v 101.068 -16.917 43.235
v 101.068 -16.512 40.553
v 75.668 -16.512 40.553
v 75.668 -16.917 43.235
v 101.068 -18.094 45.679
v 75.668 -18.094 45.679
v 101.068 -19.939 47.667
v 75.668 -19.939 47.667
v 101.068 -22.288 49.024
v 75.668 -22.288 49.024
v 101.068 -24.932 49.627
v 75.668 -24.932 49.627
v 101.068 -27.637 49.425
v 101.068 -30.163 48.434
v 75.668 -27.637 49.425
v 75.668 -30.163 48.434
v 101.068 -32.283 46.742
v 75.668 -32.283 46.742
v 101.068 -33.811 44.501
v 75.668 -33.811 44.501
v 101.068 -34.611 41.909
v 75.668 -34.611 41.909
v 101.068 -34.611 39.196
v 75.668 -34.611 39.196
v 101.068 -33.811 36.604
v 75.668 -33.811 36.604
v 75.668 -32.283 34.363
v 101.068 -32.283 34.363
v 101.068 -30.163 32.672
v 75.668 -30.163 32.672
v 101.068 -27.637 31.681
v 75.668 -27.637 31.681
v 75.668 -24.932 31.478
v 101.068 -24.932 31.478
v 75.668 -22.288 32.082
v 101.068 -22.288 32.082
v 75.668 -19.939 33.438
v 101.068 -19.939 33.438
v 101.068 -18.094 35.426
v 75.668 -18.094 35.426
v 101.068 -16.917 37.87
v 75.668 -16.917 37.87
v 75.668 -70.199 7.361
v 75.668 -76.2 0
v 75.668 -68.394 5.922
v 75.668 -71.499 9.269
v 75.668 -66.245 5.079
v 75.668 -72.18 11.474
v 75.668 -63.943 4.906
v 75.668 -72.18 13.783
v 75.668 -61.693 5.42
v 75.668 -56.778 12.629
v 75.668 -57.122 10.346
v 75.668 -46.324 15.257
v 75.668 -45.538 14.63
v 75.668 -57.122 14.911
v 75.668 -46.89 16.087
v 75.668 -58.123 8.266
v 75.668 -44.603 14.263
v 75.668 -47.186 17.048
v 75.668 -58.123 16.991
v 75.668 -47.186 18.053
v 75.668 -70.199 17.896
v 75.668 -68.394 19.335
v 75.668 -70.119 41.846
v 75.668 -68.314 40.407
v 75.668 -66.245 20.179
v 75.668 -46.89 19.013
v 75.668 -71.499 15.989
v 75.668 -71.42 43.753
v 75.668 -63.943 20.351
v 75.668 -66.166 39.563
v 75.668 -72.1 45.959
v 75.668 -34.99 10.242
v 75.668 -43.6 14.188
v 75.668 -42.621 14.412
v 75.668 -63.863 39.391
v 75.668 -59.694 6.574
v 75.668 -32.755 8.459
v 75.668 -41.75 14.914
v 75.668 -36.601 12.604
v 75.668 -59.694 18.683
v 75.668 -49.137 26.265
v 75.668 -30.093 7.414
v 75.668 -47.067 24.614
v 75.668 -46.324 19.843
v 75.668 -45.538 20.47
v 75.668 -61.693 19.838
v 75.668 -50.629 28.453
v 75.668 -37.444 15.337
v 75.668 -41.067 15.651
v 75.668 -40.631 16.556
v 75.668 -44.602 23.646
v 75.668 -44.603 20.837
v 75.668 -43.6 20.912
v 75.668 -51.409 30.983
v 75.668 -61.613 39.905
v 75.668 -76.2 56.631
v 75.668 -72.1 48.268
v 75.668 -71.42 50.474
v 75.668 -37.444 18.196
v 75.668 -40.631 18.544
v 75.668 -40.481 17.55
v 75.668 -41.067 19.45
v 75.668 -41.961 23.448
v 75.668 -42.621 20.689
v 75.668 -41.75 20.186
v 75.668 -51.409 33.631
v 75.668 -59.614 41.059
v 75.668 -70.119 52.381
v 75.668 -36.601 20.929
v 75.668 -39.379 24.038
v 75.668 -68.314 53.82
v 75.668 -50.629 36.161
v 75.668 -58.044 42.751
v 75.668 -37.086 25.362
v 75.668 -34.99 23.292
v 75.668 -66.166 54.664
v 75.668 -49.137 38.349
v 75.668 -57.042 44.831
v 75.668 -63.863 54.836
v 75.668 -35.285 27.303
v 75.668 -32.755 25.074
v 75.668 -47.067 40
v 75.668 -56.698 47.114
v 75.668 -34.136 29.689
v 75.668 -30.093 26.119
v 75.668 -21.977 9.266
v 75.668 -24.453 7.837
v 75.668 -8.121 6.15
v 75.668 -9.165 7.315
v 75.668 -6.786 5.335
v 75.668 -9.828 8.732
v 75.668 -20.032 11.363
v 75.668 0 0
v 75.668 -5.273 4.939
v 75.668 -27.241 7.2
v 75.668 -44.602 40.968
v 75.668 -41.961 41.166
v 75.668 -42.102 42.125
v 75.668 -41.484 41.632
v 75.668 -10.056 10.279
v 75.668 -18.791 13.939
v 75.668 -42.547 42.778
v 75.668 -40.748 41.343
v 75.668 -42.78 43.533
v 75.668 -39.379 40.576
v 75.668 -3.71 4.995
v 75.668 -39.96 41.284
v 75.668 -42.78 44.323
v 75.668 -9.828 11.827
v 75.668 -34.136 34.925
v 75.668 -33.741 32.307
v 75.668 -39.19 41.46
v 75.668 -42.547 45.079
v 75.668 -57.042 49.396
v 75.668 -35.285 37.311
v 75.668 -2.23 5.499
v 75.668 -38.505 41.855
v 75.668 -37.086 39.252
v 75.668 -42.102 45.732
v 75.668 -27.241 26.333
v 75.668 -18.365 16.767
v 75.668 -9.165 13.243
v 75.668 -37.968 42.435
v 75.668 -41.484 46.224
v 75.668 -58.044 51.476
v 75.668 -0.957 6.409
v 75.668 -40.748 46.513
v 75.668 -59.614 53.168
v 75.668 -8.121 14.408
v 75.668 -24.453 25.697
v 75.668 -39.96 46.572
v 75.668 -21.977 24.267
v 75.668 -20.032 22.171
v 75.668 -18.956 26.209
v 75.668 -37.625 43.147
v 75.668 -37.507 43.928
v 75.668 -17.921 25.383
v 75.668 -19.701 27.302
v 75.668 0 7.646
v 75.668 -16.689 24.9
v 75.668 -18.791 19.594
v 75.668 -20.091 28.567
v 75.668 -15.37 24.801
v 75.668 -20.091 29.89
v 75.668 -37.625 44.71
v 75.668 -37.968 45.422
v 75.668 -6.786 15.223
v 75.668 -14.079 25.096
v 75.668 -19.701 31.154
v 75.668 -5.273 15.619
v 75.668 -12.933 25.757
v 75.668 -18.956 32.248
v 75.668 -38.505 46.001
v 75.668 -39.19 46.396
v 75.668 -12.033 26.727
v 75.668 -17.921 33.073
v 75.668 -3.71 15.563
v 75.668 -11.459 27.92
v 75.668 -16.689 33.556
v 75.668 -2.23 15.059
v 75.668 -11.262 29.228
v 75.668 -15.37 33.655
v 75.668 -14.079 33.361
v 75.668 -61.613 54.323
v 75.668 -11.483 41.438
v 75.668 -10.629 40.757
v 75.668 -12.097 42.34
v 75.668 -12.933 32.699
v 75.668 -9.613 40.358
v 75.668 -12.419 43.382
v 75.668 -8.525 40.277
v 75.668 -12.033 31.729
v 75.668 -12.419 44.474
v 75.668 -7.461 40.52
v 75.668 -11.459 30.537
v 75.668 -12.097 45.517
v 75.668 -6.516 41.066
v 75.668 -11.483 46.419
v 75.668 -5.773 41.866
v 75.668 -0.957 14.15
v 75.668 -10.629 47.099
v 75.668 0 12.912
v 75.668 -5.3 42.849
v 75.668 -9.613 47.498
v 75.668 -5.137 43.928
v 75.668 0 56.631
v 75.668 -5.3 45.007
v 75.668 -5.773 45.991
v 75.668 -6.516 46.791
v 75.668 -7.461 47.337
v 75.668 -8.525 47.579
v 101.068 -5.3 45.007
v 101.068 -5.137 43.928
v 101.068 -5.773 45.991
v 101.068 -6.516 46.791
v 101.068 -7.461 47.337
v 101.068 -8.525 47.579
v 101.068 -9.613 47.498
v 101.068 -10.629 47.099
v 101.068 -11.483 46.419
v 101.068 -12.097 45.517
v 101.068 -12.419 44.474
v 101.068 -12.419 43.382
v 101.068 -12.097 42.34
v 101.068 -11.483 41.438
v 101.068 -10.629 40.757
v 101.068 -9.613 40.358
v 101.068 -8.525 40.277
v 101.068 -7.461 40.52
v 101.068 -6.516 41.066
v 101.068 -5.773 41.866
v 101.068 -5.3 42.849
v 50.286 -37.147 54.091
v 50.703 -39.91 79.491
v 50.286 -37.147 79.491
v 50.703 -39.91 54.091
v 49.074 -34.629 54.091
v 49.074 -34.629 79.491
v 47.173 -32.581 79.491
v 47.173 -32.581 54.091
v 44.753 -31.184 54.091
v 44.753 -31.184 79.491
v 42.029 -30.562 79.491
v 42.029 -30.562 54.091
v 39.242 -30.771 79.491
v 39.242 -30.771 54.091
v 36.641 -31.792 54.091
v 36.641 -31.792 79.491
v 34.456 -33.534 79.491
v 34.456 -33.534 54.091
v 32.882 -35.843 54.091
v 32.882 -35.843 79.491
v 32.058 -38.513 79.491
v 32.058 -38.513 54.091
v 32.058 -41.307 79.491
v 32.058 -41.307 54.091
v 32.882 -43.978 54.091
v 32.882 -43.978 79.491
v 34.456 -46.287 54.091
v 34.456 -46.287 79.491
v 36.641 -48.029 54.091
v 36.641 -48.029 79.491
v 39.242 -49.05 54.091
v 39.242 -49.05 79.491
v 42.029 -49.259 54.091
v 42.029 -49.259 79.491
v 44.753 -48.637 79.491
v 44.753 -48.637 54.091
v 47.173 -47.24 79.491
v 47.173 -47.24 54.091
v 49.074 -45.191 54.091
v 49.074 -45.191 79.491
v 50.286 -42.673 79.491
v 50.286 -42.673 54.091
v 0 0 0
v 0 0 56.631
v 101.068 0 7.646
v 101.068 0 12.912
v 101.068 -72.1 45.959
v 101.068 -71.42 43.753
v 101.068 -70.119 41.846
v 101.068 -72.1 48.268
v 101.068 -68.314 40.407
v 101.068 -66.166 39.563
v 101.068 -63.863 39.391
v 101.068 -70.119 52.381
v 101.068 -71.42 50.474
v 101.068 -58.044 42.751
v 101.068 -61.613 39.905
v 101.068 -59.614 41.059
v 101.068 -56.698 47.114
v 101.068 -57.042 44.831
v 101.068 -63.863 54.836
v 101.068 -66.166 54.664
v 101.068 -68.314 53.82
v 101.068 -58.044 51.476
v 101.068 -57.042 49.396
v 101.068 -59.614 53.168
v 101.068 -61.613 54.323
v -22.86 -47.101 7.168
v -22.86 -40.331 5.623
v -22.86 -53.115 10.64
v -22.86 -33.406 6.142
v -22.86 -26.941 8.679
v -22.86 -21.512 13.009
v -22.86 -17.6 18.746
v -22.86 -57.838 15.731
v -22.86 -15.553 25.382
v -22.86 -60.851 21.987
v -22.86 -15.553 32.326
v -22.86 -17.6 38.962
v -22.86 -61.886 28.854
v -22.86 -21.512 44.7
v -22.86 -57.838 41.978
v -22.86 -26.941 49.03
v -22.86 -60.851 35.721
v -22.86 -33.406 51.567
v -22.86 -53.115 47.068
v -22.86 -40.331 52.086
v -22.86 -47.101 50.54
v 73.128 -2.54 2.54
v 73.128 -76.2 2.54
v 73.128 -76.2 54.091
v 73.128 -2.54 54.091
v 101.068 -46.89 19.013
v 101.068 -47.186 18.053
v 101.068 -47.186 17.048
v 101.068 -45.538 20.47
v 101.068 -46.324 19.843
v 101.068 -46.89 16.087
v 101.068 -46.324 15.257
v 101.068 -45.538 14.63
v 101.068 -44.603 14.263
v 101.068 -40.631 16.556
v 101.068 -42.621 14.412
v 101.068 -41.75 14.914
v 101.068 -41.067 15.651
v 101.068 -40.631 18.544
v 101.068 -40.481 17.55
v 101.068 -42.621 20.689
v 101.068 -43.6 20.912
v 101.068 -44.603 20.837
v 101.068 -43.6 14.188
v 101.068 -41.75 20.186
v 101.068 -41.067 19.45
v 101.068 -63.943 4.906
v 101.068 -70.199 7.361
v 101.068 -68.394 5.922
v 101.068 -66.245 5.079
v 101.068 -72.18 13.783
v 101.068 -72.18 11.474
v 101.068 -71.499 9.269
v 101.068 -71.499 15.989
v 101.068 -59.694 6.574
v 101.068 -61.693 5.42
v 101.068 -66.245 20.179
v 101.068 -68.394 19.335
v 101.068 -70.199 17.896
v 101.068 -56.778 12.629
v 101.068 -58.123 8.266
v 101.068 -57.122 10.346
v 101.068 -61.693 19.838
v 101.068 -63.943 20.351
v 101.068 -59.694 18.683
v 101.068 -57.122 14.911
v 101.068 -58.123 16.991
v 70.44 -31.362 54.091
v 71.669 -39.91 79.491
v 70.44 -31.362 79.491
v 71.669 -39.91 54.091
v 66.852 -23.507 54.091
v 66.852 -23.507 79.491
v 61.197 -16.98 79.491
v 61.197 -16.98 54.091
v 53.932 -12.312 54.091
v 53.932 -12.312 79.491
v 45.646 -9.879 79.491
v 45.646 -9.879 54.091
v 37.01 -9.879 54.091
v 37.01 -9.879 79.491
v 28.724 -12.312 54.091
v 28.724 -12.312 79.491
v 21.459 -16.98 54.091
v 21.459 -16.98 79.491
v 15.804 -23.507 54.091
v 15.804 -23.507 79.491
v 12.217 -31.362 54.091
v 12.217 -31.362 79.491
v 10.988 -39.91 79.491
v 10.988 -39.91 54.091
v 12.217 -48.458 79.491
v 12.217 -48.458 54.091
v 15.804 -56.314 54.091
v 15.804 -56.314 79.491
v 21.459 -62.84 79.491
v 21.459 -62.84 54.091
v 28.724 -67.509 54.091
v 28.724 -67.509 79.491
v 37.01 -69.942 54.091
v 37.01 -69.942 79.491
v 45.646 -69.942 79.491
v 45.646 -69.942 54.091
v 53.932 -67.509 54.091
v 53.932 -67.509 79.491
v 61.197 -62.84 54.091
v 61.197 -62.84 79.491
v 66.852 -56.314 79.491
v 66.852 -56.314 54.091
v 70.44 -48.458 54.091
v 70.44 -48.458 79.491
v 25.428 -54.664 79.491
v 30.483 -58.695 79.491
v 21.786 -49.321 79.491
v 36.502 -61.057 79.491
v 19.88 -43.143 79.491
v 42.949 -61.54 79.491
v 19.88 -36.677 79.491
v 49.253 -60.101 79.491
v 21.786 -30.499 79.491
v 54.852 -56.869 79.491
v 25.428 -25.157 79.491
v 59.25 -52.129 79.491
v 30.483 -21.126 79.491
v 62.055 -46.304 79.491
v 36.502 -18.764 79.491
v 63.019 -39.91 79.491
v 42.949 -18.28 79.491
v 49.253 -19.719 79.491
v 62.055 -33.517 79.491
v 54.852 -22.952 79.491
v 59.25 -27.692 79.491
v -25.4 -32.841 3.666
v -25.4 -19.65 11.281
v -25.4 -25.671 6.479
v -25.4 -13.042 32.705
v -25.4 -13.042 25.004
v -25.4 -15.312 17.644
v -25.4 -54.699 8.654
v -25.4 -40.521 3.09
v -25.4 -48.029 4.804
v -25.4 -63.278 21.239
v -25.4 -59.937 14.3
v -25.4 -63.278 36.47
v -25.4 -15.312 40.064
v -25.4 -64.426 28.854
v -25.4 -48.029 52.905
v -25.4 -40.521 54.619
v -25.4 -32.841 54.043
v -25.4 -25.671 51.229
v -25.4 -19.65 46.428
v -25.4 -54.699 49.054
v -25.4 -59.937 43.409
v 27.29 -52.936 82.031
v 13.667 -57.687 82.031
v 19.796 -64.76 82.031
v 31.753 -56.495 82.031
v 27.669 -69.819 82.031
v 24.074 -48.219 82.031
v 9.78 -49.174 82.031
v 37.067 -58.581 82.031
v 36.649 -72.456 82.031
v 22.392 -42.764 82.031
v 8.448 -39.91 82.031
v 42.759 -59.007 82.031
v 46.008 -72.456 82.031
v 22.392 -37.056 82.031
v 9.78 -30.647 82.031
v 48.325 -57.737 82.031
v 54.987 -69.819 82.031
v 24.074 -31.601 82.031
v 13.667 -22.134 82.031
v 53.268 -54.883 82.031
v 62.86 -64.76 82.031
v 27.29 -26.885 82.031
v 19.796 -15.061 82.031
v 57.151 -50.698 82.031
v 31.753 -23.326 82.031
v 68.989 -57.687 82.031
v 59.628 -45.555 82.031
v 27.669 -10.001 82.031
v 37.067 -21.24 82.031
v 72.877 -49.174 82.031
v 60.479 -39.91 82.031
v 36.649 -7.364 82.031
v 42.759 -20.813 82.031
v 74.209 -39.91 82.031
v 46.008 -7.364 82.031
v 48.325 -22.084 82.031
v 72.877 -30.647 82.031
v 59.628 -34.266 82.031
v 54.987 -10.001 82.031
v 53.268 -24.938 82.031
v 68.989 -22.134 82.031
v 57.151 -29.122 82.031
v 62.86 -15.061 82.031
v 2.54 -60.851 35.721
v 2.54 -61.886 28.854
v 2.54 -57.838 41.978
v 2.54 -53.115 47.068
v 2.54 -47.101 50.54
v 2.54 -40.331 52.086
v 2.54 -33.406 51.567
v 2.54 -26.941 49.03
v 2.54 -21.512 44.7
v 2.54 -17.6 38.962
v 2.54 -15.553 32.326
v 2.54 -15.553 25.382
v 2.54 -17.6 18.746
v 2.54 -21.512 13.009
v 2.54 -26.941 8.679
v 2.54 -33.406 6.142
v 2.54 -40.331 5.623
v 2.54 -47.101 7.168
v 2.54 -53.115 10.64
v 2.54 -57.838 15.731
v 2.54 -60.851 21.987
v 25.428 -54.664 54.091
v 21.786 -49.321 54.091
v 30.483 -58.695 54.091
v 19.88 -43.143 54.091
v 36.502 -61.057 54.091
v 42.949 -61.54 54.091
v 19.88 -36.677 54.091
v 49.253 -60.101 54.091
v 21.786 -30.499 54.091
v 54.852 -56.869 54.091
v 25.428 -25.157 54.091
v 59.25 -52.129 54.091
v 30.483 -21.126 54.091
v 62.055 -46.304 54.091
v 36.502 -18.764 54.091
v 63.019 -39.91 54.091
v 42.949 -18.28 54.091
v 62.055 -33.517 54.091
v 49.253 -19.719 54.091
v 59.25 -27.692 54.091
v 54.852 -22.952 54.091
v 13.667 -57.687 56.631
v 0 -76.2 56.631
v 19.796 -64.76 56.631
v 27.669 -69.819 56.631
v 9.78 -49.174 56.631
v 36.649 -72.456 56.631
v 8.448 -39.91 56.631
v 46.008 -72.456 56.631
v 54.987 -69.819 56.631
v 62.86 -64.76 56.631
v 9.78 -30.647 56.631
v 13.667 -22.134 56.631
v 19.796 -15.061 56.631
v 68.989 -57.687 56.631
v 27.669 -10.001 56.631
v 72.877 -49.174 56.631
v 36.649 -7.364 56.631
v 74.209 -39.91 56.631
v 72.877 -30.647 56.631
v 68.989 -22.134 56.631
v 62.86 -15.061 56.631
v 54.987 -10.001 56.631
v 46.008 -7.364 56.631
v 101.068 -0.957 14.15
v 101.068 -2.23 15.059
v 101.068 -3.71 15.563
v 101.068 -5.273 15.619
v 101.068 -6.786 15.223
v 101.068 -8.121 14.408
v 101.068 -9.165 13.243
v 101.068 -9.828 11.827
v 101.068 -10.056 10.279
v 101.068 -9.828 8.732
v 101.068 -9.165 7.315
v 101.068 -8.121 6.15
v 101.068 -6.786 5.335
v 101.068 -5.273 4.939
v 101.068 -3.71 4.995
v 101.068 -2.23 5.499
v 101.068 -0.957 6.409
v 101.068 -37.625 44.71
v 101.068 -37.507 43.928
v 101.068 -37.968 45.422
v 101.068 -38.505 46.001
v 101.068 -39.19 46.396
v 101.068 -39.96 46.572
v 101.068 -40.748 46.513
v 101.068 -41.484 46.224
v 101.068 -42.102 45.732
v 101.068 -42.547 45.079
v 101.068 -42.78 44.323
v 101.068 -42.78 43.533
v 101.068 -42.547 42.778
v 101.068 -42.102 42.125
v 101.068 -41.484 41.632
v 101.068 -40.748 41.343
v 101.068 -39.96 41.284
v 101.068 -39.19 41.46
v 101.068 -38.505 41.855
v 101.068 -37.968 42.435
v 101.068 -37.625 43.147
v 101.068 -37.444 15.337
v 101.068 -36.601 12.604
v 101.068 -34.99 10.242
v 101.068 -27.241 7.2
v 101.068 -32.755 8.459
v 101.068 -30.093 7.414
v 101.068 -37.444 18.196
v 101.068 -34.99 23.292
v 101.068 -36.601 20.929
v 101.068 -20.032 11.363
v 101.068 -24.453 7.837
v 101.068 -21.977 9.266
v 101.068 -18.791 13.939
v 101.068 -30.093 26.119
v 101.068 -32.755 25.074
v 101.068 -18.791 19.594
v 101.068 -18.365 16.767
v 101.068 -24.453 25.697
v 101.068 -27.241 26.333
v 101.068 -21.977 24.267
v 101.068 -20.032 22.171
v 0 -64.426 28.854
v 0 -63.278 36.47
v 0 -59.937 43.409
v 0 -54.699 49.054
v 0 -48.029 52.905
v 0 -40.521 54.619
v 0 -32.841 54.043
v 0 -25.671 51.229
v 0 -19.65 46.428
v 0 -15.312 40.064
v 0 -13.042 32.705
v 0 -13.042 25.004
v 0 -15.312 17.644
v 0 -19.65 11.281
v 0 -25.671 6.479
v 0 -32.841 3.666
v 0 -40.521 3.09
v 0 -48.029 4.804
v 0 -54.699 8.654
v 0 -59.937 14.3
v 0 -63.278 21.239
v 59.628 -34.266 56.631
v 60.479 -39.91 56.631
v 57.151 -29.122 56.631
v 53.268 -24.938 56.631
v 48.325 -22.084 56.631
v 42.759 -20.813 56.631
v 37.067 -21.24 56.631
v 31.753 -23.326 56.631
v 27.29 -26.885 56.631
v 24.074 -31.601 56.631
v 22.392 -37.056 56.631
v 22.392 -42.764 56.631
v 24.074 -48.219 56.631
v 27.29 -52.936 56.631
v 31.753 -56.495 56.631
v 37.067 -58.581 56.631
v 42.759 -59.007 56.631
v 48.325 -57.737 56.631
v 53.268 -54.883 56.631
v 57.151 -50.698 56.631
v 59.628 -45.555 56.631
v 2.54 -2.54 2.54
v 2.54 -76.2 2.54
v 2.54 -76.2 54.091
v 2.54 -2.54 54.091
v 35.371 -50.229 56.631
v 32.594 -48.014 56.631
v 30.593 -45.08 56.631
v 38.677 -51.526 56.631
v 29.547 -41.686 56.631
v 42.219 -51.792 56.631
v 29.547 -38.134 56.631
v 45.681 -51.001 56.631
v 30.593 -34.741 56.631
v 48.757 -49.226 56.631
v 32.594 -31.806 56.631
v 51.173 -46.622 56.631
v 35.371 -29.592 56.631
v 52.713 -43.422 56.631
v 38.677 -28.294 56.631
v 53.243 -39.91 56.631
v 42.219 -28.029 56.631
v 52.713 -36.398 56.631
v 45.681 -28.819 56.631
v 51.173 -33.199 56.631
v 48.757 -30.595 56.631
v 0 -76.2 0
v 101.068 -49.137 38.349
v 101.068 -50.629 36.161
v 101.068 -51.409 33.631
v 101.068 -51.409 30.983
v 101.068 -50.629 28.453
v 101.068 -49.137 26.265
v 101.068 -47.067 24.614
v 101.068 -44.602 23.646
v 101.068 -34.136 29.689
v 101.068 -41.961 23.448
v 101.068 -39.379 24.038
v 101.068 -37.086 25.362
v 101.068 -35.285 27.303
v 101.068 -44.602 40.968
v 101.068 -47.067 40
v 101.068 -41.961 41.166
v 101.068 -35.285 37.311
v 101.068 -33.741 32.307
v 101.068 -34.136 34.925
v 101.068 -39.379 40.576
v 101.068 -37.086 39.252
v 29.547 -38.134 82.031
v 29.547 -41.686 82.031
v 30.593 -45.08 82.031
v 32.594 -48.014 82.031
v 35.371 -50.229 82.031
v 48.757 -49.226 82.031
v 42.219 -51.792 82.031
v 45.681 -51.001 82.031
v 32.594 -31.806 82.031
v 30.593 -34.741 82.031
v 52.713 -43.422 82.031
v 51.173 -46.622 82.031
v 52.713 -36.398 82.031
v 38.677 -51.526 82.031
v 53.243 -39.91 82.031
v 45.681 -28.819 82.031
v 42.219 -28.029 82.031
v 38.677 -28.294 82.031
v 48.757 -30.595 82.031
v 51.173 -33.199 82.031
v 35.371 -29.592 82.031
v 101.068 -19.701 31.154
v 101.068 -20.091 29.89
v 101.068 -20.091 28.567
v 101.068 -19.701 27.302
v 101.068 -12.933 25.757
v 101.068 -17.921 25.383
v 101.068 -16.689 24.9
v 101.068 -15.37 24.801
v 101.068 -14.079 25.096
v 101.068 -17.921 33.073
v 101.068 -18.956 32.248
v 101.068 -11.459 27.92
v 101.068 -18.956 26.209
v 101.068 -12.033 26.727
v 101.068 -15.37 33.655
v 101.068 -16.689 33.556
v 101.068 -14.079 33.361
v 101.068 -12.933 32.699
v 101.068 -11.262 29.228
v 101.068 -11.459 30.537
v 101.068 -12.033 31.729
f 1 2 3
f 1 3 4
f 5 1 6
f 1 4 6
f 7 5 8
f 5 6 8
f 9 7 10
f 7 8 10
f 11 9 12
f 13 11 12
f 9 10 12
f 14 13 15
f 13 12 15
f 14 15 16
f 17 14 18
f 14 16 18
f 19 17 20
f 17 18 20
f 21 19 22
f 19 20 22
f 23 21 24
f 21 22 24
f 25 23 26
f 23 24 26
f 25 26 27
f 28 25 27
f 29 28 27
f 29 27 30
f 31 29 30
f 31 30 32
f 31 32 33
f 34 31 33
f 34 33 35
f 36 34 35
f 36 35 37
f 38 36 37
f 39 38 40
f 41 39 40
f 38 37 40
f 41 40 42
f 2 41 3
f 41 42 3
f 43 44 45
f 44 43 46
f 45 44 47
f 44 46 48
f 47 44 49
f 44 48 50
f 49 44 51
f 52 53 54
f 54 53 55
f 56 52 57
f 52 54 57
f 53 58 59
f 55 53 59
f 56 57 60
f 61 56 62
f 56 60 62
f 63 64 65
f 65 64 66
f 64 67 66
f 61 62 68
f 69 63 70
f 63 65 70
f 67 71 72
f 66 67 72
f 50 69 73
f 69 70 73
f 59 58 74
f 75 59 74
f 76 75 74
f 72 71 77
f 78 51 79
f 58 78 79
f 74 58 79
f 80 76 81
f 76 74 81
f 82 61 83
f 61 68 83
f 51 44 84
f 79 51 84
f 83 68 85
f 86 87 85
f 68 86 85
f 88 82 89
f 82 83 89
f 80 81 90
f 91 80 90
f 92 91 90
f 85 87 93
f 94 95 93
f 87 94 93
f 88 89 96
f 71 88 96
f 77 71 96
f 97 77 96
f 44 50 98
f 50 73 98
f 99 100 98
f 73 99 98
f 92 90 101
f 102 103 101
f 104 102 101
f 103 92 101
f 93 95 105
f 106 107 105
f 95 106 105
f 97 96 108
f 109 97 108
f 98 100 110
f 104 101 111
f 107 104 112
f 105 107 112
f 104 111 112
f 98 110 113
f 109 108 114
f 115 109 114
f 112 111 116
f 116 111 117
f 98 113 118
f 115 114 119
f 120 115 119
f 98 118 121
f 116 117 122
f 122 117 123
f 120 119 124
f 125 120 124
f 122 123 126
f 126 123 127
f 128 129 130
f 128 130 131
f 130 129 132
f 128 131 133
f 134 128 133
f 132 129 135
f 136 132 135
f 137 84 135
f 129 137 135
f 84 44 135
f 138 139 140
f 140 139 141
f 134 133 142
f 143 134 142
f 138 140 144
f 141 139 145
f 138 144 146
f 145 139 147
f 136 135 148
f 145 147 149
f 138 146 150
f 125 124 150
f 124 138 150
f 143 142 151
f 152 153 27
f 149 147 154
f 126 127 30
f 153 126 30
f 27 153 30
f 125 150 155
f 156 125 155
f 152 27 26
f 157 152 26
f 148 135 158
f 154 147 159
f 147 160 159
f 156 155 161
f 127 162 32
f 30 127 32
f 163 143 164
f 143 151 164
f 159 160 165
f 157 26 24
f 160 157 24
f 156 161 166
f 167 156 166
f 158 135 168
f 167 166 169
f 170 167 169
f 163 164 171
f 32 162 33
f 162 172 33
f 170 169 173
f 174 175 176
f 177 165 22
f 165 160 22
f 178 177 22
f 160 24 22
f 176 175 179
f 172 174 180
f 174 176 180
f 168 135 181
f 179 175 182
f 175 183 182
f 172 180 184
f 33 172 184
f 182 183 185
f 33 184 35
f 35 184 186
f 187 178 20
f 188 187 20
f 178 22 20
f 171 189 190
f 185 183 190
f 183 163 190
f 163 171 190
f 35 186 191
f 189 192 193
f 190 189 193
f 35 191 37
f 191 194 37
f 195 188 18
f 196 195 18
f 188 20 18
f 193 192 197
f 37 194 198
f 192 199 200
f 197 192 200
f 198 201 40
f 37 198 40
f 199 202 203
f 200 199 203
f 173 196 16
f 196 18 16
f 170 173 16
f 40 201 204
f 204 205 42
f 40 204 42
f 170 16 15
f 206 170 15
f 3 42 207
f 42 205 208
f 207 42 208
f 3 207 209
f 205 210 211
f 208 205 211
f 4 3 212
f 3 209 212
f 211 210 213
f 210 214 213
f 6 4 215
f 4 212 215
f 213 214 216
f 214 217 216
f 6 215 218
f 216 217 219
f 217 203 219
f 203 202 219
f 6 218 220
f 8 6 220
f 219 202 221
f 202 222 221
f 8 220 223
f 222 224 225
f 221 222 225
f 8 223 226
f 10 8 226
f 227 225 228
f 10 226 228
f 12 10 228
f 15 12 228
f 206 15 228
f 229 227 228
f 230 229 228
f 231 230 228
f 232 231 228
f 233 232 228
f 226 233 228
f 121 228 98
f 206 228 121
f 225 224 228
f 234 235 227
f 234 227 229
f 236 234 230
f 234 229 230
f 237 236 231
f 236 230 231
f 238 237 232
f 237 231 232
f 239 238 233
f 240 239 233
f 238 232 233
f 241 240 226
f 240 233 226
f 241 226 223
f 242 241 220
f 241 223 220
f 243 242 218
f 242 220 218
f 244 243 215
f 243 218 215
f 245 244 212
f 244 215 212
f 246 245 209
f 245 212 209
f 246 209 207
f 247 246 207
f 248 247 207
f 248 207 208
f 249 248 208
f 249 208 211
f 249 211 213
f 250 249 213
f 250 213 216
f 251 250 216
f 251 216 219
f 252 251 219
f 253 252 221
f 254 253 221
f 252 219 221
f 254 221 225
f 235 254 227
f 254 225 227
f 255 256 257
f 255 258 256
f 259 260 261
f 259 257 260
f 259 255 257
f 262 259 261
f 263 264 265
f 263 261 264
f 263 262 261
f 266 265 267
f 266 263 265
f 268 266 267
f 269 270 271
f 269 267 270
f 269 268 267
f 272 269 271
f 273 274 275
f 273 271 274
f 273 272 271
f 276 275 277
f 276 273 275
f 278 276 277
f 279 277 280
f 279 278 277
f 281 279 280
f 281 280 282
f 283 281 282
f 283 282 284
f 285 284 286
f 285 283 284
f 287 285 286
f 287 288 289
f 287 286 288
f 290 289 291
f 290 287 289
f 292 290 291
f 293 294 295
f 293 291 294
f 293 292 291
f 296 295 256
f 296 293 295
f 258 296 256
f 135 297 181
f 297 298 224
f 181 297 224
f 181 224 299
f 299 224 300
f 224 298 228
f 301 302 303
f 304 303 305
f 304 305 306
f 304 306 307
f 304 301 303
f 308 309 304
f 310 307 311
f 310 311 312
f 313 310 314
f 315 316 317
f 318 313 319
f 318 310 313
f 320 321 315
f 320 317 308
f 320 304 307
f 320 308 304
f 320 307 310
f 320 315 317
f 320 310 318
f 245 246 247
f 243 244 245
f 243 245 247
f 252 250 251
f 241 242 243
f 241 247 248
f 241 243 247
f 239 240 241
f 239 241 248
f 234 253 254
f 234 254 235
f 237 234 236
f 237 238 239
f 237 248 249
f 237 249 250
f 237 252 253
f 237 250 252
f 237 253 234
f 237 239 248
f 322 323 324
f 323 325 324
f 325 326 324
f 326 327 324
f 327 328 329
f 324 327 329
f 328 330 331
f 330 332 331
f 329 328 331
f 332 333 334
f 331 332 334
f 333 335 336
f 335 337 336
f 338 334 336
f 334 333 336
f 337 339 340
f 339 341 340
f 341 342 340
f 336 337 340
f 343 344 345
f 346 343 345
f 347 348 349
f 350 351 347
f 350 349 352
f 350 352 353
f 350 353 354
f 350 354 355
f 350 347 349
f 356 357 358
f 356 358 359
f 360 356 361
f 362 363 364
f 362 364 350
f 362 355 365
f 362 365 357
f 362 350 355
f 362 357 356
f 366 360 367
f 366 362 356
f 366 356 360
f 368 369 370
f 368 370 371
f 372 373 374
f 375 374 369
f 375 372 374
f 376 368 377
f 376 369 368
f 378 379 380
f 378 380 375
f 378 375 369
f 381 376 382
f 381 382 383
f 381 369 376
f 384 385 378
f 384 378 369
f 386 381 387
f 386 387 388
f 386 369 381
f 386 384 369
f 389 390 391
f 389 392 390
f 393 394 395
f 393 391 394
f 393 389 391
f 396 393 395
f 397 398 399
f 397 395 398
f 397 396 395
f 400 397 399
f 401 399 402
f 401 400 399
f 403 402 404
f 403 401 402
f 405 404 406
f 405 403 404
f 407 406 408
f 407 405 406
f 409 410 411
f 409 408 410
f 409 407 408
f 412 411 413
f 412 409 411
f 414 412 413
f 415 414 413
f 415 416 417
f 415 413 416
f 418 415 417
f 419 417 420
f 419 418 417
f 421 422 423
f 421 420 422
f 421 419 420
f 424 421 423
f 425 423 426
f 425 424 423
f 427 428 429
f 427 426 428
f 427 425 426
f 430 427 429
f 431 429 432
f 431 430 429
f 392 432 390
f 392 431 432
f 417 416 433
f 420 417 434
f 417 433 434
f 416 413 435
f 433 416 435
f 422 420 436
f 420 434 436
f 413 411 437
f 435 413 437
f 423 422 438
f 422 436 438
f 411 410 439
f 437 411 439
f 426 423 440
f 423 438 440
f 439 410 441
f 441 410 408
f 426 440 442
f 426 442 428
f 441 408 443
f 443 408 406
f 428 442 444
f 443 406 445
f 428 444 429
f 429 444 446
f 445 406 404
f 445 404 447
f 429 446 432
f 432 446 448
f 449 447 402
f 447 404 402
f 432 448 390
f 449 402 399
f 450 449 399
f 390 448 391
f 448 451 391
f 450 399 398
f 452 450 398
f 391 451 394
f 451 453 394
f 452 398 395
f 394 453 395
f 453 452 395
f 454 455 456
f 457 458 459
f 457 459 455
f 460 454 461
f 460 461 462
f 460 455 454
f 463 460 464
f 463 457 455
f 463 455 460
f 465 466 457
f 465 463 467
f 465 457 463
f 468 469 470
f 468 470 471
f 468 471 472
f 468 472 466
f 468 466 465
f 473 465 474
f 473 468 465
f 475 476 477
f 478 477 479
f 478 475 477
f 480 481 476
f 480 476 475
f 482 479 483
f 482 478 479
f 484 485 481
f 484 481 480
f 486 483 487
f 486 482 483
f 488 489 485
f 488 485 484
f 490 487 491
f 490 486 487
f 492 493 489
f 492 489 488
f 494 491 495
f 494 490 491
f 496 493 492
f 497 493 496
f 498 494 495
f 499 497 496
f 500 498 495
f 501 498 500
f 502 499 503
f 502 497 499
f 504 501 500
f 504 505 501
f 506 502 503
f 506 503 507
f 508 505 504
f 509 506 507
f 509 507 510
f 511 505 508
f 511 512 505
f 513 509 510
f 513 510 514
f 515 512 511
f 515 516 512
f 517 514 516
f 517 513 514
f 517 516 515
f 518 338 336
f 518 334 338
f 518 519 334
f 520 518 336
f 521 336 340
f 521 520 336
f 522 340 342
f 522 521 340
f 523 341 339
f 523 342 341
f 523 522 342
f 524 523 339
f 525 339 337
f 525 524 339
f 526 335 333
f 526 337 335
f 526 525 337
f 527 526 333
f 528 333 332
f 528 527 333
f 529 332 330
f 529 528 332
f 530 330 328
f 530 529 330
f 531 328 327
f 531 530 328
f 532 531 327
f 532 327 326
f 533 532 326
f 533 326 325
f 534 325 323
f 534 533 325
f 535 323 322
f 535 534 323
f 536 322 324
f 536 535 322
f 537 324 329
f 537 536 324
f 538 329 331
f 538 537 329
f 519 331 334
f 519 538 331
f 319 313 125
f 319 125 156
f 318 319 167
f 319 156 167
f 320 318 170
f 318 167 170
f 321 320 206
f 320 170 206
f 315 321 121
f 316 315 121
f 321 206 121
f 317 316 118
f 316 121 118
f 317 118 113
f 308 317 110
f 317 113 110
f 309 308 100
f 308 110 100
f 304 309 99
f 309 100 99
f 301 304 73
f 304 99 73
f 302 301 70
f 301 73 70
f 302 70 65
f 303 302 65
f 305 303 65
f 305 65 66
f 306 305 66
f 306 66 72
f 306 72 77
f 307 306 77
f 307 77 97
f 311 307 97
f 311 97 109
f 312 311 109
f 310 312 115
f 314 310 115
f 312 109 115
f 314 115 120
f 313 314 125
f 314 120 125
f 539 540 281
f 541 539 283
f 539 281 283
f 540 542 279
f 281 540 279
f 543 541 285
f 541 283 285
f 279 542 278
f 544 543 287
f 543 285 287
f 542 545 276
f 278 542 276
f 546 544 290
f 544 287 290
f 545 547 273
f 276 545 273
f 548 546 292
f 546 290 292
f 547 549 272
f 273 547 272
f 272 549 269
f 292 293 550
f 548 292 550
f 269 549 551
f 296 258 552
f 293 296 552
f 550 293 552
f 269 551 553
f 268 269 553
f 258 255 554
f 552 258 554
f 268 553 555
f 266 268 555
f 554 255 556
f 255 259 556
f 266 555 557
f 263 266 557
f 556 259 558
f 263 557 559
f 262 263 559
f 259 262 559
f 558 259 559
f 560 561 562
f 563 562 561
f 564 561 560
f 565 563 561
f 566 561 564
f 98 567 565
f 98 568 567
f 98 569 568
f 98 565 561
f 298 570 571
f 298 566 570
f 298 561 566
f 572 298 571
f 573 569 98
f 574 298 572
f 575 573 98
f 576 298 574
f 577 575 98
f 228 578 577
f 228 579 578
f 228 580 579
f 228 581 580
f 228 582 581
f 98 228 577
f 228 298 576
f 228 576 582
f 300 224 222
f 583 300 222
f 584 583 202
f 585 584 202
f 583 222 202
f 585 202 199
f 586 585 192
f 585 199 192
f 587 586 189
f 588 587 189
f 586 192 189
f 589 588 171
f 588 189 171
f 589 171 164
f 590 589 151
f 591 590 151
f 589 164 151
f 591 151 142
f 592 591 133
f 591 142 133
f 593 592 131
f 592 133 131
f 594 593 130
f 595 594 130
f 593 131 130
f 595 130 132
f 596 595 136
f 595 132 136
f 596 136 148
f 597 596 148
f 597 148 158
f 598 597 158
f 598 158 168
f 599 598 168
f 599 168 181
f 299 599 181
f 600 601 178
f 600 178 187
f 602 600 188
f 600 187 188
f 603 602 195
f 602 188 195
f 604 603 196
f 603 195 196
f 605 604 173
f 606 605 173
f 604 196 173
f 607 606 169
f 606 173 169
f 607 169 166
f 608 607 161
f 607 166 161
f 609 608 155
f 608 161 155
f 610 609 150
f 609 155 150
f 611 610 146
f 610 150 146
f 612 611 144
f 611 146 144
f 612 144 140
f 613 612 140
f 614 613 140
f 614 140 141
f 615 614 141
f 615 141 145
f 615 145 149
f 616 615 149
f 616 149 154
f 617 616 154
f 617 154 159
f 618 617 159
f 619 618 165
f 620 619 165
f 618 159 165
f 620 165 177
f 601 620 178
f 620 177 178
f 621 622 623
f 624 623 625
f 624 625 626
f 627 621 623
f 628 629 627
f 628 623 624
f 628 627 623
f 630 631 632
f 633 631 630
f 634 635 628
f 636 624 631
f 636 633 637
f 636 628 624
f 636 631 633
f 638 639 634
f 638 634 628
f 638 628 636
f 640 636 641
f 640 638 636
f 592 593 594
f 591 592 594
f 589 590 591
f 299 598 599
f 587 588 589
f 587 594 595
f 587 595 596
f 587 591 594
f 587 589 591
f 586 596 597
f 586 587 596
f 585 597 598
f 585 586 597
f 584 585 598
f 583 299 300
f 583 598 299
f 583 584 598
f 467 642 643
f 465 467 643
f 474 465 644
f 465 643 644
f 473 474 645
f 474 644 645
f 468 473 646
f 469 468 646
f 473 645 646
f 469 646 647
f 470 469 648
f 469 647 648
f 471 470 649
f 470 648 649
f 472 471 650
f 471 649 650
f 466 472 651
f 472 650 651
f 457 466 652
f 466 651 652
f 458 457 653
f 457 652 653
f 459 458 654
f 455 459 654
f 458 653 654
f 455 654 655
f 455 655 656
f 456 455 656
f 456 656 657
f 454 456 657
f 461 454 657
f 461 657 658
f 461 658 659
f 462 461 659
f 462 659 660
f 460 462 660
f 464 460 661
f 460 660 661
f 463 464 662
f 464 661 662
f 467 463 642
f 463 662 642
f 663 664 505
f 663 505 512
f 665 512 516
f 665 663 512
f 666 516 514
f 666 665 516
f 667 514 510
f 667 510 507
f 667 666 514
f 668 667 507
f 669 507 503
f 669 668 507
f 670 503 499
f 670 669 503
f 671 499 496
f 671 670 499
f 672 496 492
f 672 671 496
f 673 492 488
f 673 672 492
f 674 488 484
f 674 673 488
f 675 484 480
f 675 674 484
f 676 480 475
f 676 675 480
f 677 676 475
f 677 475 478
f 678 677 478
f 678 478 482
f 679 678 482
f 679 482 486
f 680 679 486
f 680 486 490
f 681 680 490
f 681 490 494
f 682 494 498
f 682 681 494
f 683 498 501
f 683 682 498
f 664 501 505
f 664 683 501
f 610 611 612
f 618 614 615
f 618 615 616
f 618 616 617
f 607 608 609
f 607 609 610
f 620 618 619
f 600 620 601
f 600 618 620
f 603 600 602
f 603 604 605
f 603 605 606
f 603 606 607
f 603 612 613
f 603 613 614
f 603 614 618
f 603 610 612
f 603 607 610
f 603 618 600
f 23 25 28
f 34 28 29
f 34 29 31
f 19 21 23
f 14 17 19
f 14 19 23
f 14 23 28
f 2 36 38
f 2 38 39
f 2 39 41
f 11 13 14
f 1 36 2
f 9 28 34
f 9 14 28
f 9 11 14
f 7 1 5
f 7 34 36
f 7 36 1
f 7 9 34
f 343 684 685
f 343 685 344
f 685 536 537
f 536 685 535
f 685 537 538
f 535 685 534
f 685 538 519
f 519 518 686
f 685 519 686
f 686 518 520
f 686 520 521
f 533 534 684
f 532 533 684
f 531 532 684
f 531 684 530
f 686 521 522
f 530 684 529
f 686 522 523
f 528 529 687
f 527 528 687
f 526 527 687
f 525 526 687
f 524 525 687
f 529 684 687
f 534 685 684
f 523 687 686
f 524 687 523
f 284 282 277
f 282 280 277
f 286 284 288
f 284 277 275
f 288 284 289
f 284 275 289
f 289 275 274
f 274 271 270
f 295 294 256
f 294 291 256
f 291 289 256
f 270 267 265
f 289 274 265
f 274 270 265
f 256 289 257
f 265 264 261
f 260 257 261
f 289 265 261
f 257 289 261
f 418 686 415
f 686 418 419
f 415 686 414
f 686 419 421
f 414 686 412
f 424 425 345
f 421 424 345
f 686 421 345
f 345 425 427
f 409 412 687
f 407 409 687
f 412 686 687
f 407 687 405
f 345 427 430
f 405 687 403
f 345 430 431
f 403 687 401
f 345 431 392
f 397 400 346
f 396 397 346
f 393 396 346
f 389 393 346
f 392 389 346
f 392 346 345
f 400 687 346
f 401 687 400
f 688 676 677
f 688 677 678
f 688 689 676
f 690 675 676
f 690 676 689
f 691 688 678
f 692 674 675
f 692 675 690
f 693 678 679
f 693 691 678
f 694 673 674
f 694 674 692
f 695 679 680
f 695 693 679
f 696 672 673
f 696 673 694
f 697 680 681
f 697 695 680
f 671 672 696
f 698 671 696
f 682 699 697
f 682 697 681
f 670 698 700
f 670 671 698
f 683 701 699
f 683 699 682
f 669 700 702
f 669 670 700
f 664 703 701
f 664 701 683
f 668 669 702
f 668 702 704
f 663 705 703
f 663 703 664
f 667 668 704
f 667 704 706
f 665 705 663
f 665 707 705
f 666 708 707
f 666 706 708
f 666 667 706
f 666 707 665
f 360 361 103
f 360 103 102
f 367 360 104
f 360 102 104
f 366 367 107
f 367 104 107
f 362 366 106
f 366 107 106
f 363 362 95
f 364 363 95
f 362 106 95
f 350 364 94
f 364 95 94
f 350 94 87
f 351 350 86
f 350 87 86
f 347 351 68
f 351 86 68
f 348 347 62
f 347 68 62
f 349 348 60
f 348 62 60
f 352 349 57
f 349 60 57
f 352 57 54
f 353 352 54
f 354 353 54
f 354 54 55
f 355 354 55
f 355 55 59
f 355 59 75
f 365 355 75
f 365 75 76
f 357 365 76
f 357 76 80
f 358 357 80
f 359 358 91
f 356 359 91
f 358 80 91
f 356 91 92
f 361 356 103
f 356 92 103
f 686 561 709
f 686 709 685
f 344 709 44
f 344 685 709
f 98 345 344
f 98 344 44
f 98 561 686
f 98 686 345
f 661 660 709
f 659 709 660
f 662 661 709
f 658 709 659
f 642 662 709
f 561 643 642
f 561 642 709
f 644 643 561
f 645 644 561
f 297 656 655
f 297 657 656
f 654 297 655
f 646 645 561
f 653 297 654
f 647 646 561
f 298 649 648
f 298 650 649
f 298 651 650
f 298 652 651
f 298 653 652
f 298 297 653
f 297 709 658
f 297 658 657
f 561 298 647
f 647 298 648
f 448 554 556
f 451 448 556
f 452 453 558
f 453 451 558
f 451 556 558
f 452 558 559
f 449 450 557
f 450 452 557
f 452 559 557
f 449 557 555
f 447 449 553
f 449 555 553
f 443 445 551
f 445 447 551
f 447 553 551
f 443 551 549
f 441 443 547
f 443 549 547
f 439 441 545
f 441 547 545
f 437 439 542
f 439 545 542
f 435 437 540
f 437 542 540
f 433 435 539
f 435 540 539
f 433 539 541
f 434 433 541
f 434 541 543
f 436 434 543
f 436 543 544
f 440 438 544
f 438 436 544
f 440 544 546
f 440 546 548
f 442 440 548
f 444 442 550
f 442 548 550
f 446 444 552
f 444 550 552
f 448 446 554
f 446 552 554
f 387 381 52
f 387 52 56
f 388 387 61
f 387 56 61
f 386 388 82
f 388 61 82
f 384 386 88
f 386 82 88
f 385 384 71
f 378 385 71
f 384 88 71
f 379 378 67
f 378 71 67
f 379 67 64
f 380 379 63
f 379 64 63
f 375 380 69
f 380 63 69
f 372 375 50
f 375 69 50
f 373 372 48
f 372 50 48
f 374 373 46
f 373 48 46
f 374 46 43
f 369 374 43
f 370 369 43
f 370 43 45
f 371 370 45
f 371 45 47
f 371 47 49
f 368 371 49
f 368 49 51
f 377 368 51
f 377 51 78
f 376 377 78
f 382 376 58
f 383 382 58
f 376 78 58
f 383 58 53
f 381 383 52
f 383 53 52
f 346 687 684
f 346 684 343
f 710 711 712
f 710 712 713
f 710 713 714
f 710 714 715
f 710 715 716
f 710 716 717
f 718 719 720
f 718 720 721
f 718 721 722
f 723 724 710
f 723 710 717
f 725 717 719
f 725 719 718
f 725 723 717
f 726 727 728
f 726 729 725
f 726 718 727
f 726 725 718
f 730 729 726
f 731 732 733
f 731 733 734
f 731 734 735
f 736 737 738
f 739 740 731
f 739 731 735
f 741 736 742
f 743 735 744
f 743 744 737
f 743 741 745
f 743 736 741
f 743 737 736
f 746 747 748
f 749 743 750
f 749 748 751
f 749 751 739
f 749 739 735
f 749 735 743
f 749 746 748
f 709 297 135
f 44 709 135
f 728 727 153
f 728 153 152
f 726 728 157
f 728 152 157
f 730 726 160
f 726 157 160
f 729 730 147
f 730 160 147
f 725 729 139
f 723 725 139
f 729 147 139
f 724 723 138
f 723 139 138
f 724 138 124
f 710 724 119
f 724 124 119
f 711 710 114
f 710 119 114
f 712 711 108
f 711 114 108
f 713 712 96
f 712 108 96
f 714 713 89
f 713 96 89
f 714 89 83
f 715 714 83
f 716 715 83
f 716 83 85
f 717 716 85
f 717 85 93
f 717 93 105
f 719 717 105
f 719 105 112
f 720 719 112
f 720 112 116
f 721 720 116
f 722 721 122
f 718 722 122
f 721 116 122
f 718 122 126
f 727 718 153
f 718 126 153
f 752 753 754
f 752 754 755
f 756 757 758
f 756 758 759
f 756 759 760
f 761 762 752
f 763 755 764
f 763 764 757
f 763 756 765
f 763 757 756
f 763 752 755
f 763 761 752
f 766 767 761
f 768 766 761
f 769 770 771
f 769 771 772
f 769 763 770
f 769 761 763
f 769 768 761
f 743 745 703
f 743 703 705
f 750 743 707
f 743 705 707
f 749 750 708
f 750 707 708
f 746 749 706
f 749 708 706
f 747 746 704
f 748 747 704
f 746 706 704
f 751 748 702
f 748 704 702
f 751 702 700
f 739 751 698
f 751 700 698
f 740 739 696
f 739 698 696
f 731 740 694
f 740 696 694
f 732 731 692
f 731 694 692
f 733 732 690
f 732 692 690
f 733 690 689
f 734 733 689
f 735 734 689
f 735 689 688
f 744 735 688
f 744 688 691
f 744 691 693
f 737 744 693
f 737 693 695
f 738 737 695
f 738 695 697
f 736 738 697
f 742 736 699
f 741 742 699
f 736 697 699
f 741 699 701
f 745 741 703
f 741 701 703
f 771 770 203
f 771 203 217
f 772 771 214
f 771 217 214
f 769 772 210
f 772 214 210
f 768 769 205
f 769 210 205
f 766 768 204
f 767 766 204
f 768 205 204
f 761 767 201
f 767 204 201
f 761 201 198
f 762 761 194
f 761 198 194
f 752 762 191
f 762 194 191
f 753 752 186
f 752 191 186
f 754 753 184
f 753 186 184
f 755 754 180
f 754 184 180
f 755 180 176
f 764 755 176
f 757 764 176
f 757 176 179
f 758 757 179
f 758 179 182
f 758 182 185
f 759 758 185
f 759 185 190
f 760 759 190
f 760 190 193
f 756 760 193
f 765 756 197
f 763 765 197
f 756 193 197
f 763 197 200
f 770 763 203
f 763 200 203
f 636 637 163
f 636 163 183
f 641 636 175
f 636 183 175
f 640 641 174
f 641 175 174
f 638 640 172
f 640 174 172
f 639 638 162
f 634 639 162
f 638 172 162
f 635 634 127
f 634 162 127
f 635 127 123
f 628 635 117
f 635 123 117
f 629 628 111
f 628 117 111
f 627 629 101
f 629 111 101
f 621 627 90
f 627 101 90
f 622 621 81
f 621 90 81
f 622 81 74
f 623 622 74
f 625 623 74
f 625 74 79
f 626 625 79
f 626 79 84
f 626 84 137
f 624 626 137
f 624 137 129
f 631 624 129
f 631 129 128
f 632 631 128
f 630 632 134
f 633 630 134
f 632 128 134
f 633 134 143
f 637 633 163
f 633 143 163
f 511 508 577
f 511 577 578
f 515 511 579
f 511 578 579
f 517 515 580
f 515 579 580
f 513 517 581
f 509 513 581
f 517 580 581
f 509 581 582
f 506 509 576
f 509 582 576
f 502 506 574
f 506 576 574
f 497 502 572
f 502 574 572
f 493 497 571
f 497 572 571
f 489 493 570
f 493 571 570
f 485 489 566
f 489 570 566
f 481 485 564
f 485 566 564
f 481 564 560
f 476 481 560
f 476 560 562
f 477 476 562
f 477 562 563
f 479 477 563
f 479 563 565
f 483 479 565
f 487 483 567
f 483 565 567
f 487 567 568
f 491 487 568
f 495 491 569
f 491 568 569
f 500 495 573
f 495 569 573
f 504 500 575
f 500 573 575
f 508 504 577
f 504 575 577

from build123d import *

# Parameters (mm, degrees)
F0_W     = 75.6683796644
F0_H     = 56.6312596202
F1_DEPTH = 76.2
F2_R     = 32.8805478482
F2_R_2   = 27.3422805509
F2_R_3   = 19.1504254532
F2_R_4   = 11.9146478849
F3_DEPTH = 25.4
F4_R     = 25.8365396263
F4_R_2   = 16.7772933898
F4_R_3   = 9.0542222029
F5_DEPTH = 25.4
F6_T     = -2.54
F7_R     = 3.661512341
F7_R_2   = 9.1001332581
F7_R_3   = 2.6513181401
F7_R_4   = 8.8835137034
F7_R_5   = 3.3715323173
F7_R_6   = 9.593089253
F7_R_7   = 4.4394708986
F7_R_8   = 7.7443328278
F7_R_9   = 7.7443291059
F8_DEPTH = 25.4


with BuildPart() as f1:
    # F0 (on Front) → F1 (new body)
    with BuildSketch(Plane.XZ):
        with Locations((37.8341898322, 28.3156298101)):
            Rectangle(F0_W, F0_H)
    extrude(amount=F1_DEPTH)

    # F2 (on face) → F3 (join)
    with BuildSketch(Plane.XY.offset(56.6312596202)):
        with Locations((41.328176856, -39.9102717638)):
            Circle(F2_R)
        with Locations((41.328176856, -39.9102717638)):
            Circle(F2_R_2, mode=Mode.SUBTRACT)
        with Locations((41.328176856, -39.9102717638)):
            Circle(F2_R_2)
        with Locations((41.328176856, -39.9102717638)):
            Circle(F2_R_3, mode=Mode.SUBTRACT)
        with Locations((41.328176856, -39.9102717638)):
            Circle(F2_R_4)
    extrude(amount=F3_DEPTH)

    # F4 (on face) → F5 (join)
    with BuildSketch(Plane(origin=(0, 0, 0), x_dir=(0, -1, 0), z_dir=(-1, 0, 0))):
        with Locations((38.5897643864, 28.854271397)):
            Circle(F4_R)
        with Locations((38.5897643864, 28.854271397)):
            Circle(F4_R_2, mode=Mode.SUBTRACT)
        with Locations((38.5897643864, 28.854271397)):
            Circle(F4_R_2)
        with Locations((38.5897643864, 28.854271397)):
            Circle(F4_R_3, mode=Mode.SUBTRACT)
        with Locations((38.5897643864, 28.854271397)):
            Circle(F4_R_3)
    extrude(amount=F5_DEPTH)

    # F6
    f6_openings = [f1.faces().sort_by_distance(p)[0] for p in [
        (37.83419, -76.2, 28.31563),
    ]]
    offset(amount=F6_T, openings=f6_openings, kind=Kind.INTERSECTION)

    # F7 (on face) → F8 (join)
    with BuildSketch(Plane.YZ.offset(75.6683796644)):
        with Locations((-8.7984241545, 43.9281985164)):
            Circle(F7_R)
        with Locations((-25.612493977, 40.552649647)):
            Circle(F7_R_2)
        with Locations((-40.1582121849, 43.9281985164)):
            Circle(F7_R_3)
        with Locations((-42.6249019802, 32.3069766164)):
            Circle(F7_R_4)
        with Locations((-43.8523180783, 17.5502598286)):
            Circle(F7_R_5)
        with Locations((-27.9581807554, 16.7665481567)):
            Circle(F7_R_6)
        with Locations((-15.7014150172, 29.2281731963)):
            Circle(F7_R_7)
        with BuildLine():
            Line((0, 7.6459474177), (0, 12.9123390406))
            ThreePointArc((0, 12.9123390406), (-10.0560886873, 10.2791432291), (0, 7.6459474177))
        make_face()
        with Locations((-64.4422322512, 47.1135601401)):
            Circle(F7_R_8)
        with Locations((-64.5220428705, 12.6286838204)):
            Circle(F7_R_9)
    extrude(amount=F8_DEPTH)


solid = f1.part
